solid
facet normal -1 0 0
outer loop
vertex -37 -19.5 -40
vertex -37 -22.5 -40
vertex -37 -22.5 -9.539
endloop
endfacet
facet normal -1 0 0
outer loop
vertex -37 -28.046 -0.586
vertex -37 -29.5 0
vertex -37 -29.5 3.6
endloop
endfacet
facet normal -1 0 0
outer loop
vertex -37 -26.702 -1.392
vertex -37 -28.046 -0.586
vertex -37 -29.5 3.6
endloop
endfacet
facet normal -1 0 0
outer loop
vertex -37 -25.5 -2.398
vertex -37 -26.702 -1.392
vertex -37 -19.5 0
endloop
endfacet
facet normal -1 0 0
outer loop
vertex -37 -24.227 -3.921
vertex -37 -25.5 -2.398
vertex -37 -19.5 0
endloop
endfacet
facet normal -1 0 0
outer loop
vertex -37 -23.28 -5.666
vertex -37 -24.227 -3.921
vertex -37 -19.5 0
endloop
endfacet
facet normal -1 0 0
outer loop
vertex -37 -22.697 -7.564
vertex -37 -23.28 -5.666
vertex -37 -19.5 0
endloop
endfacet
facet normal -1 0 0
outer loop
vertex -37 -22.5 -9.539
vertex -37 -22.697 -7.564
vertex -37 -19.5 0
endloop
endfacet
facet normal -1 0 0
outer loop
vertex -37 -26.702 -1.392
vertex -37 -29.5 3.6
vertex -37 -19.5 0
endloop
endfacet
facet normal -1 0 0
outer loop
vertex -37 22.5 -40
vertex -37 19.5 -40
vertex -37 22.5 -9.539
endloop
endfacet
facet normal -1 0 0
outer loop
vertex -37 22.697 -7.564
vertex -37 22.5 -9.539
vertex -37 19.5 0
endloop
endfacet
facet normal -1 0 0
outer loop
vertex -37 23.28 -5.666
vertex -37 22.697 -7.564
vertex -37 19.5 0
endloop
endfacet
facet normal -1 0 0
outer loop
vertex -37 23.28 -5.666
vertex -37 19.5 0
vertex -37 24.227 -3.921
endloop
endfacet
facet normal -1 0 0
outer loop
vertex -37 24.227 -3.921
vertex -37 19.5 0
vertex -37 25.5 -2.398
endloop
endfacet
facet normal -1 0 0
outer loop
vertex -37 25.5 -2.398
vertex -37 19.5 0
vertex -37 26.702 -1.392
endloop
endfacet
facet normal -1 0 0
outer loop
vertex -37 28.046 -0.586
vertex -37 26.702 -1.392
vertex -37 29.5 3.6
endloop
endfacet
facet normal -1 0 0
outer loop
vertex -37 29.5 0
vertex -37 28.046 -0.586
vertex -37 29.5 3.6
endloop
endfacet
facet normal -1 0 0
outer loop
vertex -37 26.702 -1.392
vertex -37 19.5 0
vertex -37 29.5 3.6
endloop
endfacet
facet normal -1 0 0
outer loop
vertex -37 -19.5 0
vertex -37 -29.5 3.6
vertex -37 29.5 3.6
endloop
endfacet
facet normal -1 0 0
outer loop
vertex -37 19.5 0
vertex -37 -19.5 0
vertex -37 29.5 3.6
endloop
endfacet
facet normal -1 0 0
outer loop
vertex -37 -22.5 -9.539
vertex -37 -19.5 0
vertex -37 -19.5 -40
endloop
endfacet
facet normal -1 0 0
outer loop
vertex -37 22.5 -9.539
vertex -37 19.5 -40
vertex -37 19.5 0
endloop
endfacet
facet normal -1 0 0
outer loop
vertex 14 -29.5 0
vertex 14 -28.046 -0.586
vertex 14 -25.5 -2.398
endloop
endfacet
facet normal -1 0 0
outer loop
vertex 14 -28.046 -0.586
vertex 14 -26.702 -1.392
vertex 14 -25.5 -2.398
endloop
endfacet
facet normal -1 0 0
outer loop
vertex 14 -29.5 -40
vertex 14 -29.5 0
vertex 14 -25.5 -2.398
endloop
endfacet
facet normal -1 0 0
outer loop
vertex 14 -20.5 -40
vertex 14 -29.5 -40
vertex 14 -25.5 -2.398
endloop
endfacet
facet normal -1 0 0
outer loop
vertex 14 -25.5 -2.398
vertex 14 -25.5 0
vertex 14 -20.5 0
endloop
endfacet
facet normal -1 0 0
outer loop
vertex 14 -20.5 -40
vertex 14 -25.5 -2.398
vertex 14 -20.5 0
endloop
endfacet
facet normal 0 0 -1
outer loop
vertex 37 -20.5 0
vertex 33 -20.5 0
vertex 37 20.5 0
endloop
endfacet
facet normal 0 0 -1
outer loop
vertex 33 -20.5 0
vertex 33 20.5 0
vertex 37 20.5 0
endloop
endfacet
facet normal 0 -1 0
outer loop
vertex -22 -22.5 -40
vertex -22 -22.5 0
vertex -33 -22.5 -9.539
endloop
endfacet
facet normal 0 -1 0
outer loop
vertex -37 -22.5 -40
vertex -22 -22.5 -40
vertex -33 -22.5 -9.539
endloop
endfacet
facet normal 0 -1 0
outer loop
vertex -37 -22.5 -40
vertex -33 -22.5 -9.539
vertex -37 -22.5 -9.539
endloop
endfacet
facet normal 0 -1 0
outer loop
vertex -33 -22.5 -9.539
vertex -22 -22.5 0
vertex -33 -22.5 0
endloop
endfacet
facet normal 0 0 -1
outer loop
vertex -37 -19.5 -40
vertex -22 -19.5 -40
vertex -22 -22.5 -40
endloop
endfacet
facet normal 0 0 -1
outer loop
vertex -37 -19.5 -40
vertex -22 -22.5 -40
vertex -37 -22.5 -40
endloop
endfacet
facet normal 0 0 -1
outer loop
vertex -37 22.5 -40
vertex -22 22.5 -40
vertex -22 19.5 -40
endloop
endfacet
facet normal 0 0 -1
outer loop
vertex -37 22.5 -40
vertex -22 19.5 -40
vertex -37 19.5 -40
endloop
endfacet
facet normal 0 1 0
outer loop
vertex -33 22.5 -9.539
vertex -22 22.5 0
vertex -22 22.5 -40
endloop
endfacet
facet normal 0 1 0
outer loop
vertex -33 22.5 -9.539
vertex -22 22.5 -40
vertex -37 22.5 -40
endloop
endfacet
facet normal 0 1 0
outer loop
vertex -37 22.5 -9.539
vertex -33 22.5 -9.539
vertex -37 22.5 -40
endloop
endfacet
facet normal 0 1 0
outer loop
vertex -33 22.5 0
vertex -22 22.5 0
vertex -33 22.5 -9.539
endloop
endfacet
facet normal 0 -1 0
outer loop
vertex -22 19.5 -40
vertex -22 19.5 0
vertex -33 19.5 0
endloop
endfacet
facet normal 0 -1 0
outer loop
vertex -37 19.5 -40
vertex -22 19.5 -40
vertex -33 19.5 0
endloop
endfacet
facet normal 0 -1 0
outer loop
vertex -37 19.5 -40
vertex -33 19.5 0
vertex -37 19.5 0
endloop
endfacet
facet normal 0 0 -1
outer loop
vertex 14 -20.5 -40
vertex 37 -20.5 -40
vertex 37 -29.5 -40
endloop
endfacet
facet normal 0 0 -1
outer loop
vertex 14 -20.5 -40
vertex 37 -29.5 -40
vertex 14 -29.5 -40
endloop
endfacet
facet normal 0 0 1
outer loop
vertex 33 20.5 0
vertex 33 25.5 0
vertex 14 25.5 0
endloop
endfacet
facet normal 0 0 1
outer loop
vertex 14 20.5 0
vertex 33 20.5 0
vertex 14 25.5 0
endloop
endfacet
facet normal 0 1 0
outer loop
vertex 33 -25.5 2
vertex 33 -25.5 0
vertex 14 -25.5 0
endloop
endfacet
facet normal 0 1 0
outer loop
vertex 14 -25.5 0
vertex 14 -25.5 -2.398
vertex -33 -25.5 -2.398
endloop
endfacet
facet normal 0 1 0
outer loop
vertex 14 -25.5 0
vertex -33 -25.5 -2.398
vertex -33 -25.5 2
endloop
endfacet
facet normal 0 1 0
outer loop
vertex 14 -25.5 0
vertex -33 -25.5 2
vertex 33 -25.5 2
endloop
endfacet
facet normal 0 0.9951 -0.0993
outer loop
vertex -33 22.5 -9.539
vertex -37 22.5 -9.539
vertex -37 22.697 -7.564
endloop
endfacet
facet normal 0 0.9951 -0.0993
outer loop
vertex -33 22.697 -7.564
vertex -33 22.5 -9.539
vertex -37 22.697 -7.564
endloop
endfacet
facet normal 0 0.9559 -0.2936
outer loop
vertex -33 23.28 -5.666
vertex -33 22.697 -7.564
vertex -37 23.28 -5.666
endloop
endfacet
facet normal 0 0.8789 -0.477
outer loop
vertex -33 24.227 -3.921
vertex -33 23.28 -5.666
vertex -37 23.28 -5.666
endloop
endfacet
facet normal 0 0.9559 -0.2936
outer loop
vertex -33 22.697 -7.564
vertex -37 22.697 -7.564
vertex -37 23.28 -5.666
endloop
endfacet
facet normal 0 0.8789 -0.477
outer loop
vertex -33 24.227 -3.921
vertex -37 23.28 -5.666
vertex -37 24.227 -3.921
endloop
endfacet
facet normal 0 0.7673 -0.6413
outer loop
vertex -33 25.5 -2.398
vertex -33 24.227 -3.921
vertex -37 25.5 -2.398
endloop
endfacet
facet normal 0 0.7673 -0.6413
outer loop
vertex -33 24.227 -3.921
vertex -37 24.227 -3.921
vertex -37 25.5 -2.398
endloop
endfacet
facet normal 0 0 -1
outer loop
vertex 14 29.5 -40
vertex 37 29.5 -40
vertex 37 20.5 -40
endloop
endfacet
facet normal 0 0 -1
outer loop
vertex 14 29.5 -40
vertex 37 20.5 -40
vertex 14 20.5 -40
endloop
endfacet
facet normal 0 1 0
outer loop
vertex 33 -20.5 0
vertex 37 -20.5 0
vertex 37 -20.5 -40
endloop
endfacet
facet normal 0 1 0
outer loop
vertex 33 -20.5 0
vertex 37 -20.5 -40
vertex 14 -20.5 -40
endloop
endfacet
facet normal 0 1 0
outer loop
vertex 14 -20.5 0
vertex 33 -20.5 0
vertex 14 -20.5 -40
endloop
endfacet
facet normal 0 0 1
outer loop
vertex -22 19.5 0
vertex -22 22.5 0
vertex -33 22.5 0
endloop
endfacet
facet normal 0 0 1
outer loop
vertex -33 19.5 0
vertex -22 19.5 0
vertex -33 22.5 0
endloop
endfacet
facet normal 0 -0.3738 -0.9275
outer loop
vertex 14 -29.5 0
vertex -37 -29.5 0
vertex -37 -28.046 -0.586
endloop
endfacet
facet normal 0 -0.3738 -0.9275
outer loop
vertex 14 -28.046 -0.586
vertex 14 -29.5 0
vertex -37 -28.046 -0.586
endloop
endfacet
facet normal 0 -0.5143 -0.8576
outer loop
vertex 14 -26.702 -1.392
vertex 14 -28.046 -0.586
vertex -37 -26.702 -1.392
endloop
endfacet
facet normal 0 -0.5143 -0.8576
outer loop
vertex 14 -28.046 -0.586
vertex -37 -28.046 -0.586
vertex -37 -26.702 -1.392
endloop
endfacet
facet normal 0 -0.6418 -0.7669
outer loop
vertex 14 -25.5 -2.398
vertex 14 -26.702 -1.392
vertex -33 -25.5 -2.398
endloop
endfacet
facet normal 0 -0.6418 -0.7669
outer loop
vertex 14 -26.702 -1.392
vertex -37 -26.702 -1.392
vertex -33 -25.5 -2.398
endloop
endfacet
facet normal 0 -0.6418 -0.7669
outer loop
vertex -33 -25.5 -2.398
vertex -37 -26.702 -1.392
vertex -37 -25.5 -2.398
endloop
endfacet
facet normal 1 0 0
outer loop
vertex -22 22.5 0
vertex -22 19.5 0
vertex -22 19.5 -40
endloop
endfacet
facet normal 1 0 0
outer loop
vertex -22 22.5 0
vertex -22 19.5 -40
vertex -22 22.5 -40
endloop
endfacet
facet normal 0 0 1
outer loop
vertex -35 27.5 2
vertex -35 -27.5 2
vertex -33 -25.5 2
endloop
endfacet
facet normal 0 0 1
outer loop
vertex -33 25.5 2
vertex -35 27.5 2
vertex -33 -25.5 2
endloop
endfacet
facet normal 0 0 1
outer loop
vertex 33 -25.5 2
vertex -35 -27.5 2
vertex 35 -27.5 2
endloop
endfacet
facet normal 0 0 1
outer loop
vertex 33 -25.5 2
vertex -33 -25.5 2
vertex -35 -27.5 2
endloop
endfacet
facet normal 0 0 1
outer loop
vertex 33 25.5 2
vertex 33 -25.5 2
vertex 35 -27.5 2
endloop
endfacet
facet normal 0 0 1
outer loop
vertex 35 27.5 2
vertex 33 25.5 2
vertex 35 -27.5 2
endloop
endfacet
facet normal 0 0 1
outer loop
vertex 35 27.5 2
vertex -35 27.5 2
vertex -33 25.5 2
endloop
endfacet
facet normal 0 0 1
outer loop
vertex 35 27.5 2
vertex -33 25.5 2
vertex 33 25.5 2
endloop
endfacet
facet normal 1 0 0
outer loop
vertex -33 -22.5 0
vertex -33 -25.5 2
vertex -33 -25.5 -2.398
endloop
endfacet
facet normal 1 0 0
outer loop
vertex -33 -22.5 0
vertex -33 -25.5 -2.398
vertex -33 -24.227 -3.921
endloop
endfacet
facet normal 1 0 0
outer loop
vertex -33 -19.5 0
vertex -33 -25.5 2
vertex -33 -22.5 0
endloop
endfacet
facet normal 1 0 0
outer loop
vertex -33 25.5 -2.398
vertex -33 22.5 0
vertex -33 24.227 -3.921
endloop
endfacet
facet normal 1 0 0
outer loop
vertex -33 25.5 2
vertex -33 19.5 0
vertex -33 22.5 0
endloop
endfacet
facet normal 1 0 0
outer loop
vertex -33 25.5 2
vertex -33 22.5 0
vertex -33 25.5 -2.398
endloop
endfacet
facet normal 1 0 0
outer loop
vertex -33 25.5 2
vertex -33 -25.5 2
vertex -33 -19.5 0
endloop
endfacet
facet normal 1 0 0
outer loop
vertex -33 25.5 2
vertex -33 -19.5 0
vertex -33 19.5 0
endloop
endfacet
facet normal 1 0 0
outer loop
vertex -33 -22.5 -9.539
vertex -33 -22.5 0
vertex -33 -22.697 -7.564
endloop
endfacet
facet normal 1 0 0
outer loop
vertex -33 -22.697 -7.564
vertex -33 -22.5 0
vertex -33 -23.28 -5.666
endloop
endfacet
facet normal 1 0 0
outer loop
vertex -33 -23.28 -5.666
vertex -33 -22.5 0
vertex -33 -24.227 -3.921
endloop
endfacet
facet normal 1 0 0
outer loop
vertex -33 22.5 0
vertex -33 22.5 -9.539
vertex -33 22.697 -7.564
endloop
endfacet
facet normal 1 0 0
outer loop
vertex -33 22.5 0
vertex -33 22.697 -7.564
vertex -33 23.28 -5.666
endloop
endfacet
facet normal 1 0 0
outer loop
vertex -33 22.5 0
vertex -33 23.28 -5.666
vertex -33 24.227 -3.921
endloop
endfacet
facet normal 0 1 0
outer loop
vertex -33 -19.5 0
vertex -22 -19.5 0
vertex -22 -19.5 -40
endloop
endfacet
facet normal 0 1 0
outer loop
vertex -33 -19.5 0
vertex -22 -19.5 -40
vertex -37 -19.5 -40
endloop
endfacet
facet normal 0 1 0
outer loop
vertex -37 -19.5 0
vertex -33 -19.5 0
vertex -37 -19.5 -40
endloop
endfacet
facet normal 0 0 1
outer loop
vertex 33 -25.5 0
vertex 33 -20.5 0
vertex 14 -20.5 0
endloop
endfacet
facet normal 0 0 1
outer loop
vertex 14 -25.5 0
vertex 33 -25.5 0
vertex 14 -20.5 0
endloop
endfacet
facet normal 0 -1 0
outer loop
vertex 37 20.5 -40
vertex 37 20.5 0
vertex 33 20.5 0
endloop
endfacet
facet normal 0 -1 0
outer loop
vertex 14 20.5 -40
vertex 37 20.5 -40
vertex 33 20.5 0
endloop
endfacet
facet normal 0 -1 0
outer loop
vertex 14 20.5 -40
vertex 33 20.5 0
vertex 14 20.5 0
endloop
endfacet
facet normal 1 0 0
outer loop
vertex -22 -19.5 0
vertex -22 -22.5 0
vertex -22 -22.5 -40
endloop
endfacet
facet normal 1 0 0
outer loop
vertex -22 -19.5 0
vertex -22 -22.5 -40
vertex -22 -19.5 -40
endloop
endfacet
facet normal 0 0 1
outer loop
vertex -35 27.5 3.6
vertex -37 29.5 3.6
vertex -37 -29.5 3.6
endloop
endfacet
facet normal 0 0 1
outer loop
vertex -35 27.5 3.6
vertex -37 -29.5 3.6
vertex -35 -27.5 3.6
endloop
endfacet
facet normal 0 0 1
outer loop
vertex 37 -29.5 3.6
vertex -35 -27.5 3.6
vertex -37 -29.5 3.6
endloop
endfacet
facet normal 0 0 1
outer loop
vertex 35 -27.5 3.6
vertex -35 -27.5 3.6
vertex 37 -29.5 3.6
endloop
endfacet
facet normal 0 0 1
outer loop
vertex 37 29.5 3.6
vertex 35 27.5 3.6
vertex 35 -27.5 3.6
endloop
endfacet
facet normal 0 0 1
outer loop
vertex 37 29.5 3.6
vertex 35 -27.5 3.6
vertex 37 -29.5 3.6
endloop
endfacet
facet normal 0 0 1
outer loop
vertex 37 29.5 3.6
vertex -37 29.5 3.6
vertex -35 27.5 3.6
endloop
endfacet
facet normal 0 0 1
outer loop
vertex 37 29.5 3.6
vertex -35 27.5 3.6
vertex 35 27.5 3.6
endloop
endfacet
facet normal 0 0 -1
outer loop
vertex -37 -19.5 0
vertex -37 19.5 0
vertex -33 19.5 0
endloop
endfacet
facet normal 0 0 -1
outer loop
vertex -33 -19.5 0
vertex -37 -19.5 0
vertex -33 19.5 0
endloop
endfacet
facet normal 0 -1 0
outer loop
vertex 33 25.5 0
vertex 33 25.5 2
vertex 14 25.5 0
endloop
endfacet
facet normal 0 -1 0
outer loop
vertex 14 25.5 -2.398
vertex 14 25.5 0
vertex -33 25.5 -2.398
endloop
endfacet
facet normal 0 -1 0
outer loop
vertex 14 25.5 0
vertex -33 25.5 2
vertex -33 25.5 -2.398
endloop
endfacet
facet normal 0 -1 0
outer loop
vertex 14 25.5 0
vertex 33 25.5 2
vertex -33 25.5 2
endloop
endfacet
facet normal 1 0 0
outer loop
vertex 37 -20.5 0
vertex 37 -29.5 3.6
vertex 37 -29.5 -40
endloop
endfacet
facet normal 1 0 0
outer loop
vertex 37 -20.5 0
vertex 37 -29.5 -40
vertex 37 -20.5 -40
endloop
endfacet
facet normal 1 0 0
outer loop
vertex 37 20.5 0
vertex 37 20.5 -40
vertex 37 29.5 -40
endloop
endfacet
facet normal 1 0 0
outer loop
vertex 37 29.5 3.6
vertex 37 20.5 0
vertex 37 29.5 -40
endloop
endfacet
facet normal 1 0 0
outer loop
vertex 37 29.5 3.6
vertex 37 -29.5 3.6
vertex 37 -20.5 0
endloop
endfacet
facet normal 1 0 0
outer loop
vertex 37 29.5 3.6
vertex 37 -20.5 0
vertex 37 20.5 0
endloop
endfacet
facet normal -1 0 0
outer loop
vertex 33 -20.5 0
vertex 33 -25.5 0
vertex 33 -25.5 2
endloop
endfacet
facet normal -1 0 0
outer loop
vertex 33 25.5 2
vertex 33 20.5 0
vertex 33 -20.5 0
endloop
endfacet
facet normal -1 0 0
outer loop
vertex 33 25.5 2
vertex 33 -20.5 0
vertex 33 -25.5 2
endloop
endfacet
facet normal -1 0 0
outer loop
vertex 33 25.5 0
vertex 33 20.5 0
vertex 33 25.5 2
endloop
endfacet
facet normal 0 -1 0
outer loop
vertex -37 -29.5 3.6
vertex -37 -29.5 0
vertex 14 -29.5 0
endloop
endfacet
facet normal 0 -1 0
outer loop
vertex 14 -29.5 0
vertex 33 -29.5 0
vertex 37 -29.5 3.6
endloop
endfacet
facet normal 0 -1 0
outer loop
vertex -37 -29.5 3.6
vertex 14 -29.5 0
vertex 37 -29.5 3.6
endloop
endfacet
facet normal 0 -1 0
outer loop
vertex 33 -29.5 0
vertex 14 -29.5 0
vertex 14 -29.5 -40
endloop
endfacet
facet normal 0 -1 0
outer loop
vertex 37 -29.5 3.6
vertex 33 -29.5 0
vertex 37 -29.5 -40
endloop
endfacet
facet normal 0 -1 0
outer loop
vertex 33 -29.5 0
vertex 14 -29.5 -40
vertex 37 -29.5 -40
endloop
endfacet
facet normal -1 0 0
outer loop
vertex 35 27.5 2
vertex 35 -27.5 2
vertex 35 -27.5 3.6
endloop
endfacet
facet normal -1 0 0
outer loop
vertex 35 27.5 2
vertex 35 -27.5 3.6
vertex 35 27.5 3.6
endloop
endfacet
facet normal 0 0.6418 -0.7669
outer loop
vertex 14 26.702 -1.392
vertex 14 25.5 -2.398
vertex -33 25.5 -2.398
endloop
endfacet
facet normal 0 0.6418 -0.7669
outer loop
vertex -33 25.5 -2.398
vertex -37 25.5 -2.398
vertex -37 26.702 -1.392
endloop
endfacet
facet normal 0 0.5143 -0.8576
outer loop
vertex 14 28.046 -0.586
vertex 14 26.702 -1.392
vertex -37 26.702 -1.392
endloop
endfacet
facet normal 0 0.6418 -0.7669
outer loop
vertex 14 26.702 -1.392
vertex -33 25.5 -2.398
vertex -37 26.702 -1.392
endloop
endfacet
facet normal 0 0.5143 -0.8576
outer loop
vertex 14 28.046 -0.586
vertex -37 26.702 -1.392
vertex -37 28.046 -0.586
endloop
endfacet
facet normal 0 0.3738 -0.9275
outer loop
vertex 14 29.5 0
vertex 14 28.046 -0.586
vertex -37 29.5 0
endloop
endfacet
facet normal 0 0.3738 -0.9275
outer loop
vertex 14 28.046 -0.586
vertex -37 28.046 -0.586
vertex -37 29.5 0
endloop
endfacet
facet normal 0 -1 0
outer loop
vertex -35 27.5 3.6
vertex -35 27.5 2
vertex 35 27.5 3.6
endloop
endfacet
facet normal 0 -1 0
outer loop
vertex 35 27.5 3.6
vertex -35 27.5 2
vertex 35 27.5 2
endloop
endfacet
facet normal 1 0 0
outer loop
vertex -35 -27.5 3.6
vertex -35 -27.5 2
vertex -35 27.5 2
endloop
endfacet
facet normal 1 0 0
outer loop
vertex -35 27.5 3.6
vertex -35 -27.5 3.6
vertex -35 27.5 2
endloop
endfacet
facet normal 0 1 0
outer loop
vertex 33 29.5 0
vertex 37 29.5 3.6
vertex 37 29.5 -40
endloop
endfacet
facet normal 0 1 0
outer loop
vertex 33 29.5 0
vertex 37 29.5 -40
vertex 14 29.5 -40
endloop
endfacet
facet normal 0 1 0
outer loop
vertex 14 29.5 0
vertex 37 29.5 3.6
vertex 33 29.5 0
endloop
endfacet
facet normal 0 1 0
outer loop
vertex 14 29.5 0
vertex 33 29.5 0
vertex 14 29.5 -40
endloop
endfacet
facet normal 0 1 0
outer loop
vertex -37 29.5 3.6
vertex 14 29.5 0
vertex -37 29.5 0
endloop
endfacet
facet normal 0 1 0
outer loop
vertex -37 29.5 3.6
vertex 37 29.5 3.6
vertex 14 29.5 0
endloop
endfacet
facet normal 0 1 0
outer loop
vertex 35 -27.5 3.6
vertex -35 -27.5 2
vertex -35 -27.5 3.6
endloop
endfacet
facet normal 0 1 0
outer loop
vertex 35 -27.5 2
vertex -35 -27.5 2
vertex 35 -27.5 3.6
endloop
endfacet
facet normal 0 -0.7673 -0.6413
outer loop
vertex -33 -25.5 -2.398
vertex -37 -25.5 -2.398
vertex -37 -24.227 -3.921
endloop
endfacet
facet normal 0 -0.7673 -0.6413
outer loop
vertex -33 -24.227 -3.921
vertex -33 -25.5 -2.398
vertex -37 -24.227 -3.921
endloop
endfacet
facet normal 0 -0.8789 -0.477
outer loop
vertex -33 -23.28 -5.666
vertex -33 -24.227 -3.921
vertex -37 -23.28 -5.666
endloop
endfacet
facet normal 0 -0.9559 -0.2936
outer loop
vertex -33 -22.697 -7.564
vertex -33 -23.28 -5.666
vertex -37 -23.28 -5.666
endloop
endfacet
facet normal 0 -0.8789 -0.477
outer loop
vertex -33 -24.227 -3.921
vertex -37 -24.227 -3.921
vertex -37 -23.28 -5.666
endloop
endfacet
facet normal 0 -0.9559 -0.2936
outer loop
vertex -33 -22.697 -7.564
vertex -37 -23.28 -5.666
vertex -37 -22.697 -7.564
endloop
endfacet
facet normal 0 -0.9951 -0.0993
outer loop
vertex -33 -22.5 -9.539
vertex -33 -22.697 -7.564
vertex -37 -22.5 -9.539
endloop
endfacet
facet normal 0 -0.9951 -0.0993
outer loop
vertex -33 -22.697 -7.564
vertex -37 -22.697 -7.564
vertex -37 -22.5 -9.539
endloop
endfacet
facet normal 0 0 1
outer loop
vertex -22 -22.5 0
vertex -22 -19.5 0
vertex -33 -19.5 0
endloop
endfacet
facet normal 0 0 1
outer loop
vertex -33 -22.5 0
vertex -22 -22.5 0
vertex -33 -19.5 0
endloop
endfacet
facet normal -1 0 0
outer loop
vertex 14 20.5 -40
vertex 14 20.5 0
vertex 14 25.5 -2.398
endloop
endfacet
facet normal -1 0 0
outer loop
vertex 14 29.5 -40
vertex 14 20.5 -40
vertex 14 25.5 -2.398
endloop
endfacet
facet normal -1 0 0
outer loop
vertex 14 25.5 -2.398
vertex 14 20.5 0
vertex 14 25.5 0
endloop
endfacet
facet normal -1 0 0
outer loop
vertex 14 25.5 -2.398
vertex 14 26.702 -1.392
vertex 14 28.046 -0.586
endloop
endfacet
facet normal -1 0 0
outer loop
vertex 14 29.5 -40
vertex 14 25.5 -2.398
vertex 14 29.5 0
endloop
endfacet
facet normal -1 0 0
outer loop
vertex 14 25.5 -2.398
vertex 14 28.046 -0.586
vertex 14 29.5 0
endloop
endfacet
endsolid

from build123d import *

# Parameters (mm, degrees)
SKETCH1_W                = 70
SKETCH1_H                = 55
SKETCH1_W_2              = 66
SKETCH1_H_2              = 51
BOSS_EXTRUDE1_DEPTH      = 2
BOSS_EXTRUDE2_DEPTH      = 1.6
BOSS_EXTRUDE2_DEPTH_BACK = 2
SKETCH2_W                = 74
SKETCH2_H                = 59
SKETCH2_W_2              = 70
SKETCH2_H_2              = 55
SKETCH3_W                = 23
SKETCH3_H                = 9
SKETCH3_W_2              = 15
SKETCH3_H_2              = 3
BOSS_EXTRUDE3_DEPTH      = 40
FILLET1_START            = -37
FILLET1_DEPTH            = 70
FILLET1_2_DEPTH          = 4


with BuildPart() as part:
    # Sketch1 → Boss-Extrude1 (new body)
    with BuildSketch(Plane.XY):
        Rectangle(SKETCH1_W, SKETCH1_H)
        Rectangle(SKETCH1_W_2, SKETCH1_H_2, mode=Mode.SUBTRACT)
    extrude(amount=BOSS_EXTRUDE1_DEPTH)

    # Sketch2 → Boss-Extrude2 (add, two sides: drawn at the far end of the back side and taken through both)
    with BuildSketch(Plane.XY.offset(2).offset(-BOSS_EXTRUDE2_DEPTH_BACK)):
        Rectangle(SKETCH2_W, SKETCH2_H)
        Rectangle(SKETCH2_W_2, SKETCH2_H_2, mode=Mode.SUBTRACT)
    extrude(amount=BOSS_EXTRUDE2_DEPTH + BOSS_EXTRUDE2_DEPTH_BACK)

    # Sketch3 → Boss-Extrude3 (add)
    with BuildSketch(Plane(origin=(0, 0, 0), x_dir=(-1, 0, 0), z_dir=(0, 0, -1))):
        with Locations((-25.5, 25)):
            Rectangle(SKETCH3_W, SKETCH3_H)
        with Locations((-25.5, -25)):
            Rectangle(SKETCH3_W, SKETCH3_H)
        with Locations((29.5, 21)):
            Rectangle(SKETCH3_W_2, SKETCH3_H_2)
        with Locations((29.5, -21)):
            Rectangle(SKETCH3_W_2, SKETCH3_H_2)
    extrude(amount=BOSS_EXTRUDE3_DEPTH)

    # Fillet1: read off the stored shape, not the designer's step
    # Fillet1 outline → Fillet1 (add)
    with BuildSketch(Plane.YZ.offset(FILLET1_START)):
        with BuildLine():
            Line((29.5, 0), (25.5, 0))
            Line((25.5, 0), (25.5, -2.397963586))
            ThreePointArc((25.5, -2.397963586), (27.358253474, -0.962536958), (29.5, 0))
        make_face()
        with BuildLine():
            ThreePointArc((-29.5, 0), (-27.358253474, -0.962536958), (-25.5, -2.397963586))
            Line((-25.5, -2.397963586), (-25.5, 0))
            Line((-25.5, 0), (-29.5, 0))
        make_face()
    extrude(amount=FILLET1_DEPTH)

    # Fillet1 2 outline → Fillet1 2 (add)
    with BuildSketch(Plane.YZ.offset(FILLET1_START)):
        with BuildLine():
            Line((25.5, -2.397963586), (25.5, 0))
            Line((25.5, 0), (22.5, 0))
            Line((22.5, 0), (22.5, -9.539392014))
            ThreePointArc((22.5, -9.539392014), (23.280455543, -5.666408668), (25.5, -2.397963586))
        make_face()
        with BuildLine():
            Line((-25.5, 0), (-25.5, -2.397963586))
            ThreePointArc((-25.5, -2.397963586), (-23.280455543, -5.666408668), (-22.5, -9.539392014))
            Line((-22.5, -9.539392014), (-22.5, 0))
            Line((-22.5, 0), (-25.5, 0))
        make_face()
    extrude(amount=FILLET1_2_DEPTH)


solid = part.part
